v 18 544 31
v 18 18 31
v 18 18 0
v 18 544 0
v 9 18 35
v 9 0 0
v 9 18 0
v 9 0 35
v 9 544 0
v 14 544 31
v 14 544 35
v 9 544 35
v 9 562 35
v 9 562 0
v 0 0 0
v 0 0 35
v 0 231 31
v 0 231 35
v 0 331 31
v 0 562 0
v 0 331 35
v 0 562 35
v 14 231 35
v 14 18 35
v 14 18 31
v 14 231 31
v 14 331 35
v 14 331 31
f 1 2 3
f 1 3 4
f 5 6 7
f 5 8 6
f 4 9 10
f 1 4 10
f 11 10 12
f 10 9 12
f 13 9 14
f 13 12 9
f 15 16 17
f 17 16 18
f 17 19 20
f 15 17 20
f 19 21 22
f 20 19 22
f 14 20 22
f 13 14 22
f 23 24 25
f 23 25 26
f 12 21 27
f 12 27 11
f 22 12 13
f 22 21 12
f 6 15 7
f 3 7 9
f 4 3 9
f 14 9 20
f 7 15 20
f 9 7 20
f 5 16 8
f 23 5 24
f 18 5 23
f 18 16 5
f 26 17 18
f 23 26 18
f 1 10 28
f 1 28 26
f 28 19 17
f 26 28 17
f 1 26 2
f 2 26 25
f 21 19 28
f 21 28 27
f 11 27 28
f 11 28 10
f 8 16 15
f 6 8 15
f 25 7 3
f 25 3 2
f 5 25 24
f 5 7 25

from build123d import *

# Parameters (mm, degrees)
F1_DEPTH = 18
F0_W     = 18
F0_H     = 31
F0_H_2   = 4
F2_DEPTH = 9
F0_W_2   = 213
F3_DEPTH = 14


with BuildPart() as f1:
    # F0 (on Right) → F1 (new body)
    with BuildSketch(Plane.YZ):
        Polygon((18, 31), (18, 0), (544, 0), (544, 31), (331, 31), (281, 31), (231, 31), align=None)
    extrude(amount=F1_DEPTH)

    # F0 (on Right) → F2 (join)
    with BuildSketch(Plane.YZ):
        with Locations((9, 15.5)):
            Rectangle(F0_W, F0_H)
        with Locations((553, 15.5)):
            Rectangle(F0_W, F0_H)
        with Locations((9, 33)):
            Rectangle(F0_W, F0_H_2)
        with Locations((553, 33)):
            Rectangle(F0_W, F0_H_2)
    extrude(amount=F2_DEPTH)

    # F0 (on Right) → F3 (join)
    with BuildSketch(Plane.YZ):
        with Locations((124.5, 33)):
            Rectangle(F0_W_2, F0_H_2)
        with Locations((437.5, 33)):
            Rectangle(F0_W_2, F0_H_2)
    extrude(amount=F3_DEPTH)


solid = f1.part
